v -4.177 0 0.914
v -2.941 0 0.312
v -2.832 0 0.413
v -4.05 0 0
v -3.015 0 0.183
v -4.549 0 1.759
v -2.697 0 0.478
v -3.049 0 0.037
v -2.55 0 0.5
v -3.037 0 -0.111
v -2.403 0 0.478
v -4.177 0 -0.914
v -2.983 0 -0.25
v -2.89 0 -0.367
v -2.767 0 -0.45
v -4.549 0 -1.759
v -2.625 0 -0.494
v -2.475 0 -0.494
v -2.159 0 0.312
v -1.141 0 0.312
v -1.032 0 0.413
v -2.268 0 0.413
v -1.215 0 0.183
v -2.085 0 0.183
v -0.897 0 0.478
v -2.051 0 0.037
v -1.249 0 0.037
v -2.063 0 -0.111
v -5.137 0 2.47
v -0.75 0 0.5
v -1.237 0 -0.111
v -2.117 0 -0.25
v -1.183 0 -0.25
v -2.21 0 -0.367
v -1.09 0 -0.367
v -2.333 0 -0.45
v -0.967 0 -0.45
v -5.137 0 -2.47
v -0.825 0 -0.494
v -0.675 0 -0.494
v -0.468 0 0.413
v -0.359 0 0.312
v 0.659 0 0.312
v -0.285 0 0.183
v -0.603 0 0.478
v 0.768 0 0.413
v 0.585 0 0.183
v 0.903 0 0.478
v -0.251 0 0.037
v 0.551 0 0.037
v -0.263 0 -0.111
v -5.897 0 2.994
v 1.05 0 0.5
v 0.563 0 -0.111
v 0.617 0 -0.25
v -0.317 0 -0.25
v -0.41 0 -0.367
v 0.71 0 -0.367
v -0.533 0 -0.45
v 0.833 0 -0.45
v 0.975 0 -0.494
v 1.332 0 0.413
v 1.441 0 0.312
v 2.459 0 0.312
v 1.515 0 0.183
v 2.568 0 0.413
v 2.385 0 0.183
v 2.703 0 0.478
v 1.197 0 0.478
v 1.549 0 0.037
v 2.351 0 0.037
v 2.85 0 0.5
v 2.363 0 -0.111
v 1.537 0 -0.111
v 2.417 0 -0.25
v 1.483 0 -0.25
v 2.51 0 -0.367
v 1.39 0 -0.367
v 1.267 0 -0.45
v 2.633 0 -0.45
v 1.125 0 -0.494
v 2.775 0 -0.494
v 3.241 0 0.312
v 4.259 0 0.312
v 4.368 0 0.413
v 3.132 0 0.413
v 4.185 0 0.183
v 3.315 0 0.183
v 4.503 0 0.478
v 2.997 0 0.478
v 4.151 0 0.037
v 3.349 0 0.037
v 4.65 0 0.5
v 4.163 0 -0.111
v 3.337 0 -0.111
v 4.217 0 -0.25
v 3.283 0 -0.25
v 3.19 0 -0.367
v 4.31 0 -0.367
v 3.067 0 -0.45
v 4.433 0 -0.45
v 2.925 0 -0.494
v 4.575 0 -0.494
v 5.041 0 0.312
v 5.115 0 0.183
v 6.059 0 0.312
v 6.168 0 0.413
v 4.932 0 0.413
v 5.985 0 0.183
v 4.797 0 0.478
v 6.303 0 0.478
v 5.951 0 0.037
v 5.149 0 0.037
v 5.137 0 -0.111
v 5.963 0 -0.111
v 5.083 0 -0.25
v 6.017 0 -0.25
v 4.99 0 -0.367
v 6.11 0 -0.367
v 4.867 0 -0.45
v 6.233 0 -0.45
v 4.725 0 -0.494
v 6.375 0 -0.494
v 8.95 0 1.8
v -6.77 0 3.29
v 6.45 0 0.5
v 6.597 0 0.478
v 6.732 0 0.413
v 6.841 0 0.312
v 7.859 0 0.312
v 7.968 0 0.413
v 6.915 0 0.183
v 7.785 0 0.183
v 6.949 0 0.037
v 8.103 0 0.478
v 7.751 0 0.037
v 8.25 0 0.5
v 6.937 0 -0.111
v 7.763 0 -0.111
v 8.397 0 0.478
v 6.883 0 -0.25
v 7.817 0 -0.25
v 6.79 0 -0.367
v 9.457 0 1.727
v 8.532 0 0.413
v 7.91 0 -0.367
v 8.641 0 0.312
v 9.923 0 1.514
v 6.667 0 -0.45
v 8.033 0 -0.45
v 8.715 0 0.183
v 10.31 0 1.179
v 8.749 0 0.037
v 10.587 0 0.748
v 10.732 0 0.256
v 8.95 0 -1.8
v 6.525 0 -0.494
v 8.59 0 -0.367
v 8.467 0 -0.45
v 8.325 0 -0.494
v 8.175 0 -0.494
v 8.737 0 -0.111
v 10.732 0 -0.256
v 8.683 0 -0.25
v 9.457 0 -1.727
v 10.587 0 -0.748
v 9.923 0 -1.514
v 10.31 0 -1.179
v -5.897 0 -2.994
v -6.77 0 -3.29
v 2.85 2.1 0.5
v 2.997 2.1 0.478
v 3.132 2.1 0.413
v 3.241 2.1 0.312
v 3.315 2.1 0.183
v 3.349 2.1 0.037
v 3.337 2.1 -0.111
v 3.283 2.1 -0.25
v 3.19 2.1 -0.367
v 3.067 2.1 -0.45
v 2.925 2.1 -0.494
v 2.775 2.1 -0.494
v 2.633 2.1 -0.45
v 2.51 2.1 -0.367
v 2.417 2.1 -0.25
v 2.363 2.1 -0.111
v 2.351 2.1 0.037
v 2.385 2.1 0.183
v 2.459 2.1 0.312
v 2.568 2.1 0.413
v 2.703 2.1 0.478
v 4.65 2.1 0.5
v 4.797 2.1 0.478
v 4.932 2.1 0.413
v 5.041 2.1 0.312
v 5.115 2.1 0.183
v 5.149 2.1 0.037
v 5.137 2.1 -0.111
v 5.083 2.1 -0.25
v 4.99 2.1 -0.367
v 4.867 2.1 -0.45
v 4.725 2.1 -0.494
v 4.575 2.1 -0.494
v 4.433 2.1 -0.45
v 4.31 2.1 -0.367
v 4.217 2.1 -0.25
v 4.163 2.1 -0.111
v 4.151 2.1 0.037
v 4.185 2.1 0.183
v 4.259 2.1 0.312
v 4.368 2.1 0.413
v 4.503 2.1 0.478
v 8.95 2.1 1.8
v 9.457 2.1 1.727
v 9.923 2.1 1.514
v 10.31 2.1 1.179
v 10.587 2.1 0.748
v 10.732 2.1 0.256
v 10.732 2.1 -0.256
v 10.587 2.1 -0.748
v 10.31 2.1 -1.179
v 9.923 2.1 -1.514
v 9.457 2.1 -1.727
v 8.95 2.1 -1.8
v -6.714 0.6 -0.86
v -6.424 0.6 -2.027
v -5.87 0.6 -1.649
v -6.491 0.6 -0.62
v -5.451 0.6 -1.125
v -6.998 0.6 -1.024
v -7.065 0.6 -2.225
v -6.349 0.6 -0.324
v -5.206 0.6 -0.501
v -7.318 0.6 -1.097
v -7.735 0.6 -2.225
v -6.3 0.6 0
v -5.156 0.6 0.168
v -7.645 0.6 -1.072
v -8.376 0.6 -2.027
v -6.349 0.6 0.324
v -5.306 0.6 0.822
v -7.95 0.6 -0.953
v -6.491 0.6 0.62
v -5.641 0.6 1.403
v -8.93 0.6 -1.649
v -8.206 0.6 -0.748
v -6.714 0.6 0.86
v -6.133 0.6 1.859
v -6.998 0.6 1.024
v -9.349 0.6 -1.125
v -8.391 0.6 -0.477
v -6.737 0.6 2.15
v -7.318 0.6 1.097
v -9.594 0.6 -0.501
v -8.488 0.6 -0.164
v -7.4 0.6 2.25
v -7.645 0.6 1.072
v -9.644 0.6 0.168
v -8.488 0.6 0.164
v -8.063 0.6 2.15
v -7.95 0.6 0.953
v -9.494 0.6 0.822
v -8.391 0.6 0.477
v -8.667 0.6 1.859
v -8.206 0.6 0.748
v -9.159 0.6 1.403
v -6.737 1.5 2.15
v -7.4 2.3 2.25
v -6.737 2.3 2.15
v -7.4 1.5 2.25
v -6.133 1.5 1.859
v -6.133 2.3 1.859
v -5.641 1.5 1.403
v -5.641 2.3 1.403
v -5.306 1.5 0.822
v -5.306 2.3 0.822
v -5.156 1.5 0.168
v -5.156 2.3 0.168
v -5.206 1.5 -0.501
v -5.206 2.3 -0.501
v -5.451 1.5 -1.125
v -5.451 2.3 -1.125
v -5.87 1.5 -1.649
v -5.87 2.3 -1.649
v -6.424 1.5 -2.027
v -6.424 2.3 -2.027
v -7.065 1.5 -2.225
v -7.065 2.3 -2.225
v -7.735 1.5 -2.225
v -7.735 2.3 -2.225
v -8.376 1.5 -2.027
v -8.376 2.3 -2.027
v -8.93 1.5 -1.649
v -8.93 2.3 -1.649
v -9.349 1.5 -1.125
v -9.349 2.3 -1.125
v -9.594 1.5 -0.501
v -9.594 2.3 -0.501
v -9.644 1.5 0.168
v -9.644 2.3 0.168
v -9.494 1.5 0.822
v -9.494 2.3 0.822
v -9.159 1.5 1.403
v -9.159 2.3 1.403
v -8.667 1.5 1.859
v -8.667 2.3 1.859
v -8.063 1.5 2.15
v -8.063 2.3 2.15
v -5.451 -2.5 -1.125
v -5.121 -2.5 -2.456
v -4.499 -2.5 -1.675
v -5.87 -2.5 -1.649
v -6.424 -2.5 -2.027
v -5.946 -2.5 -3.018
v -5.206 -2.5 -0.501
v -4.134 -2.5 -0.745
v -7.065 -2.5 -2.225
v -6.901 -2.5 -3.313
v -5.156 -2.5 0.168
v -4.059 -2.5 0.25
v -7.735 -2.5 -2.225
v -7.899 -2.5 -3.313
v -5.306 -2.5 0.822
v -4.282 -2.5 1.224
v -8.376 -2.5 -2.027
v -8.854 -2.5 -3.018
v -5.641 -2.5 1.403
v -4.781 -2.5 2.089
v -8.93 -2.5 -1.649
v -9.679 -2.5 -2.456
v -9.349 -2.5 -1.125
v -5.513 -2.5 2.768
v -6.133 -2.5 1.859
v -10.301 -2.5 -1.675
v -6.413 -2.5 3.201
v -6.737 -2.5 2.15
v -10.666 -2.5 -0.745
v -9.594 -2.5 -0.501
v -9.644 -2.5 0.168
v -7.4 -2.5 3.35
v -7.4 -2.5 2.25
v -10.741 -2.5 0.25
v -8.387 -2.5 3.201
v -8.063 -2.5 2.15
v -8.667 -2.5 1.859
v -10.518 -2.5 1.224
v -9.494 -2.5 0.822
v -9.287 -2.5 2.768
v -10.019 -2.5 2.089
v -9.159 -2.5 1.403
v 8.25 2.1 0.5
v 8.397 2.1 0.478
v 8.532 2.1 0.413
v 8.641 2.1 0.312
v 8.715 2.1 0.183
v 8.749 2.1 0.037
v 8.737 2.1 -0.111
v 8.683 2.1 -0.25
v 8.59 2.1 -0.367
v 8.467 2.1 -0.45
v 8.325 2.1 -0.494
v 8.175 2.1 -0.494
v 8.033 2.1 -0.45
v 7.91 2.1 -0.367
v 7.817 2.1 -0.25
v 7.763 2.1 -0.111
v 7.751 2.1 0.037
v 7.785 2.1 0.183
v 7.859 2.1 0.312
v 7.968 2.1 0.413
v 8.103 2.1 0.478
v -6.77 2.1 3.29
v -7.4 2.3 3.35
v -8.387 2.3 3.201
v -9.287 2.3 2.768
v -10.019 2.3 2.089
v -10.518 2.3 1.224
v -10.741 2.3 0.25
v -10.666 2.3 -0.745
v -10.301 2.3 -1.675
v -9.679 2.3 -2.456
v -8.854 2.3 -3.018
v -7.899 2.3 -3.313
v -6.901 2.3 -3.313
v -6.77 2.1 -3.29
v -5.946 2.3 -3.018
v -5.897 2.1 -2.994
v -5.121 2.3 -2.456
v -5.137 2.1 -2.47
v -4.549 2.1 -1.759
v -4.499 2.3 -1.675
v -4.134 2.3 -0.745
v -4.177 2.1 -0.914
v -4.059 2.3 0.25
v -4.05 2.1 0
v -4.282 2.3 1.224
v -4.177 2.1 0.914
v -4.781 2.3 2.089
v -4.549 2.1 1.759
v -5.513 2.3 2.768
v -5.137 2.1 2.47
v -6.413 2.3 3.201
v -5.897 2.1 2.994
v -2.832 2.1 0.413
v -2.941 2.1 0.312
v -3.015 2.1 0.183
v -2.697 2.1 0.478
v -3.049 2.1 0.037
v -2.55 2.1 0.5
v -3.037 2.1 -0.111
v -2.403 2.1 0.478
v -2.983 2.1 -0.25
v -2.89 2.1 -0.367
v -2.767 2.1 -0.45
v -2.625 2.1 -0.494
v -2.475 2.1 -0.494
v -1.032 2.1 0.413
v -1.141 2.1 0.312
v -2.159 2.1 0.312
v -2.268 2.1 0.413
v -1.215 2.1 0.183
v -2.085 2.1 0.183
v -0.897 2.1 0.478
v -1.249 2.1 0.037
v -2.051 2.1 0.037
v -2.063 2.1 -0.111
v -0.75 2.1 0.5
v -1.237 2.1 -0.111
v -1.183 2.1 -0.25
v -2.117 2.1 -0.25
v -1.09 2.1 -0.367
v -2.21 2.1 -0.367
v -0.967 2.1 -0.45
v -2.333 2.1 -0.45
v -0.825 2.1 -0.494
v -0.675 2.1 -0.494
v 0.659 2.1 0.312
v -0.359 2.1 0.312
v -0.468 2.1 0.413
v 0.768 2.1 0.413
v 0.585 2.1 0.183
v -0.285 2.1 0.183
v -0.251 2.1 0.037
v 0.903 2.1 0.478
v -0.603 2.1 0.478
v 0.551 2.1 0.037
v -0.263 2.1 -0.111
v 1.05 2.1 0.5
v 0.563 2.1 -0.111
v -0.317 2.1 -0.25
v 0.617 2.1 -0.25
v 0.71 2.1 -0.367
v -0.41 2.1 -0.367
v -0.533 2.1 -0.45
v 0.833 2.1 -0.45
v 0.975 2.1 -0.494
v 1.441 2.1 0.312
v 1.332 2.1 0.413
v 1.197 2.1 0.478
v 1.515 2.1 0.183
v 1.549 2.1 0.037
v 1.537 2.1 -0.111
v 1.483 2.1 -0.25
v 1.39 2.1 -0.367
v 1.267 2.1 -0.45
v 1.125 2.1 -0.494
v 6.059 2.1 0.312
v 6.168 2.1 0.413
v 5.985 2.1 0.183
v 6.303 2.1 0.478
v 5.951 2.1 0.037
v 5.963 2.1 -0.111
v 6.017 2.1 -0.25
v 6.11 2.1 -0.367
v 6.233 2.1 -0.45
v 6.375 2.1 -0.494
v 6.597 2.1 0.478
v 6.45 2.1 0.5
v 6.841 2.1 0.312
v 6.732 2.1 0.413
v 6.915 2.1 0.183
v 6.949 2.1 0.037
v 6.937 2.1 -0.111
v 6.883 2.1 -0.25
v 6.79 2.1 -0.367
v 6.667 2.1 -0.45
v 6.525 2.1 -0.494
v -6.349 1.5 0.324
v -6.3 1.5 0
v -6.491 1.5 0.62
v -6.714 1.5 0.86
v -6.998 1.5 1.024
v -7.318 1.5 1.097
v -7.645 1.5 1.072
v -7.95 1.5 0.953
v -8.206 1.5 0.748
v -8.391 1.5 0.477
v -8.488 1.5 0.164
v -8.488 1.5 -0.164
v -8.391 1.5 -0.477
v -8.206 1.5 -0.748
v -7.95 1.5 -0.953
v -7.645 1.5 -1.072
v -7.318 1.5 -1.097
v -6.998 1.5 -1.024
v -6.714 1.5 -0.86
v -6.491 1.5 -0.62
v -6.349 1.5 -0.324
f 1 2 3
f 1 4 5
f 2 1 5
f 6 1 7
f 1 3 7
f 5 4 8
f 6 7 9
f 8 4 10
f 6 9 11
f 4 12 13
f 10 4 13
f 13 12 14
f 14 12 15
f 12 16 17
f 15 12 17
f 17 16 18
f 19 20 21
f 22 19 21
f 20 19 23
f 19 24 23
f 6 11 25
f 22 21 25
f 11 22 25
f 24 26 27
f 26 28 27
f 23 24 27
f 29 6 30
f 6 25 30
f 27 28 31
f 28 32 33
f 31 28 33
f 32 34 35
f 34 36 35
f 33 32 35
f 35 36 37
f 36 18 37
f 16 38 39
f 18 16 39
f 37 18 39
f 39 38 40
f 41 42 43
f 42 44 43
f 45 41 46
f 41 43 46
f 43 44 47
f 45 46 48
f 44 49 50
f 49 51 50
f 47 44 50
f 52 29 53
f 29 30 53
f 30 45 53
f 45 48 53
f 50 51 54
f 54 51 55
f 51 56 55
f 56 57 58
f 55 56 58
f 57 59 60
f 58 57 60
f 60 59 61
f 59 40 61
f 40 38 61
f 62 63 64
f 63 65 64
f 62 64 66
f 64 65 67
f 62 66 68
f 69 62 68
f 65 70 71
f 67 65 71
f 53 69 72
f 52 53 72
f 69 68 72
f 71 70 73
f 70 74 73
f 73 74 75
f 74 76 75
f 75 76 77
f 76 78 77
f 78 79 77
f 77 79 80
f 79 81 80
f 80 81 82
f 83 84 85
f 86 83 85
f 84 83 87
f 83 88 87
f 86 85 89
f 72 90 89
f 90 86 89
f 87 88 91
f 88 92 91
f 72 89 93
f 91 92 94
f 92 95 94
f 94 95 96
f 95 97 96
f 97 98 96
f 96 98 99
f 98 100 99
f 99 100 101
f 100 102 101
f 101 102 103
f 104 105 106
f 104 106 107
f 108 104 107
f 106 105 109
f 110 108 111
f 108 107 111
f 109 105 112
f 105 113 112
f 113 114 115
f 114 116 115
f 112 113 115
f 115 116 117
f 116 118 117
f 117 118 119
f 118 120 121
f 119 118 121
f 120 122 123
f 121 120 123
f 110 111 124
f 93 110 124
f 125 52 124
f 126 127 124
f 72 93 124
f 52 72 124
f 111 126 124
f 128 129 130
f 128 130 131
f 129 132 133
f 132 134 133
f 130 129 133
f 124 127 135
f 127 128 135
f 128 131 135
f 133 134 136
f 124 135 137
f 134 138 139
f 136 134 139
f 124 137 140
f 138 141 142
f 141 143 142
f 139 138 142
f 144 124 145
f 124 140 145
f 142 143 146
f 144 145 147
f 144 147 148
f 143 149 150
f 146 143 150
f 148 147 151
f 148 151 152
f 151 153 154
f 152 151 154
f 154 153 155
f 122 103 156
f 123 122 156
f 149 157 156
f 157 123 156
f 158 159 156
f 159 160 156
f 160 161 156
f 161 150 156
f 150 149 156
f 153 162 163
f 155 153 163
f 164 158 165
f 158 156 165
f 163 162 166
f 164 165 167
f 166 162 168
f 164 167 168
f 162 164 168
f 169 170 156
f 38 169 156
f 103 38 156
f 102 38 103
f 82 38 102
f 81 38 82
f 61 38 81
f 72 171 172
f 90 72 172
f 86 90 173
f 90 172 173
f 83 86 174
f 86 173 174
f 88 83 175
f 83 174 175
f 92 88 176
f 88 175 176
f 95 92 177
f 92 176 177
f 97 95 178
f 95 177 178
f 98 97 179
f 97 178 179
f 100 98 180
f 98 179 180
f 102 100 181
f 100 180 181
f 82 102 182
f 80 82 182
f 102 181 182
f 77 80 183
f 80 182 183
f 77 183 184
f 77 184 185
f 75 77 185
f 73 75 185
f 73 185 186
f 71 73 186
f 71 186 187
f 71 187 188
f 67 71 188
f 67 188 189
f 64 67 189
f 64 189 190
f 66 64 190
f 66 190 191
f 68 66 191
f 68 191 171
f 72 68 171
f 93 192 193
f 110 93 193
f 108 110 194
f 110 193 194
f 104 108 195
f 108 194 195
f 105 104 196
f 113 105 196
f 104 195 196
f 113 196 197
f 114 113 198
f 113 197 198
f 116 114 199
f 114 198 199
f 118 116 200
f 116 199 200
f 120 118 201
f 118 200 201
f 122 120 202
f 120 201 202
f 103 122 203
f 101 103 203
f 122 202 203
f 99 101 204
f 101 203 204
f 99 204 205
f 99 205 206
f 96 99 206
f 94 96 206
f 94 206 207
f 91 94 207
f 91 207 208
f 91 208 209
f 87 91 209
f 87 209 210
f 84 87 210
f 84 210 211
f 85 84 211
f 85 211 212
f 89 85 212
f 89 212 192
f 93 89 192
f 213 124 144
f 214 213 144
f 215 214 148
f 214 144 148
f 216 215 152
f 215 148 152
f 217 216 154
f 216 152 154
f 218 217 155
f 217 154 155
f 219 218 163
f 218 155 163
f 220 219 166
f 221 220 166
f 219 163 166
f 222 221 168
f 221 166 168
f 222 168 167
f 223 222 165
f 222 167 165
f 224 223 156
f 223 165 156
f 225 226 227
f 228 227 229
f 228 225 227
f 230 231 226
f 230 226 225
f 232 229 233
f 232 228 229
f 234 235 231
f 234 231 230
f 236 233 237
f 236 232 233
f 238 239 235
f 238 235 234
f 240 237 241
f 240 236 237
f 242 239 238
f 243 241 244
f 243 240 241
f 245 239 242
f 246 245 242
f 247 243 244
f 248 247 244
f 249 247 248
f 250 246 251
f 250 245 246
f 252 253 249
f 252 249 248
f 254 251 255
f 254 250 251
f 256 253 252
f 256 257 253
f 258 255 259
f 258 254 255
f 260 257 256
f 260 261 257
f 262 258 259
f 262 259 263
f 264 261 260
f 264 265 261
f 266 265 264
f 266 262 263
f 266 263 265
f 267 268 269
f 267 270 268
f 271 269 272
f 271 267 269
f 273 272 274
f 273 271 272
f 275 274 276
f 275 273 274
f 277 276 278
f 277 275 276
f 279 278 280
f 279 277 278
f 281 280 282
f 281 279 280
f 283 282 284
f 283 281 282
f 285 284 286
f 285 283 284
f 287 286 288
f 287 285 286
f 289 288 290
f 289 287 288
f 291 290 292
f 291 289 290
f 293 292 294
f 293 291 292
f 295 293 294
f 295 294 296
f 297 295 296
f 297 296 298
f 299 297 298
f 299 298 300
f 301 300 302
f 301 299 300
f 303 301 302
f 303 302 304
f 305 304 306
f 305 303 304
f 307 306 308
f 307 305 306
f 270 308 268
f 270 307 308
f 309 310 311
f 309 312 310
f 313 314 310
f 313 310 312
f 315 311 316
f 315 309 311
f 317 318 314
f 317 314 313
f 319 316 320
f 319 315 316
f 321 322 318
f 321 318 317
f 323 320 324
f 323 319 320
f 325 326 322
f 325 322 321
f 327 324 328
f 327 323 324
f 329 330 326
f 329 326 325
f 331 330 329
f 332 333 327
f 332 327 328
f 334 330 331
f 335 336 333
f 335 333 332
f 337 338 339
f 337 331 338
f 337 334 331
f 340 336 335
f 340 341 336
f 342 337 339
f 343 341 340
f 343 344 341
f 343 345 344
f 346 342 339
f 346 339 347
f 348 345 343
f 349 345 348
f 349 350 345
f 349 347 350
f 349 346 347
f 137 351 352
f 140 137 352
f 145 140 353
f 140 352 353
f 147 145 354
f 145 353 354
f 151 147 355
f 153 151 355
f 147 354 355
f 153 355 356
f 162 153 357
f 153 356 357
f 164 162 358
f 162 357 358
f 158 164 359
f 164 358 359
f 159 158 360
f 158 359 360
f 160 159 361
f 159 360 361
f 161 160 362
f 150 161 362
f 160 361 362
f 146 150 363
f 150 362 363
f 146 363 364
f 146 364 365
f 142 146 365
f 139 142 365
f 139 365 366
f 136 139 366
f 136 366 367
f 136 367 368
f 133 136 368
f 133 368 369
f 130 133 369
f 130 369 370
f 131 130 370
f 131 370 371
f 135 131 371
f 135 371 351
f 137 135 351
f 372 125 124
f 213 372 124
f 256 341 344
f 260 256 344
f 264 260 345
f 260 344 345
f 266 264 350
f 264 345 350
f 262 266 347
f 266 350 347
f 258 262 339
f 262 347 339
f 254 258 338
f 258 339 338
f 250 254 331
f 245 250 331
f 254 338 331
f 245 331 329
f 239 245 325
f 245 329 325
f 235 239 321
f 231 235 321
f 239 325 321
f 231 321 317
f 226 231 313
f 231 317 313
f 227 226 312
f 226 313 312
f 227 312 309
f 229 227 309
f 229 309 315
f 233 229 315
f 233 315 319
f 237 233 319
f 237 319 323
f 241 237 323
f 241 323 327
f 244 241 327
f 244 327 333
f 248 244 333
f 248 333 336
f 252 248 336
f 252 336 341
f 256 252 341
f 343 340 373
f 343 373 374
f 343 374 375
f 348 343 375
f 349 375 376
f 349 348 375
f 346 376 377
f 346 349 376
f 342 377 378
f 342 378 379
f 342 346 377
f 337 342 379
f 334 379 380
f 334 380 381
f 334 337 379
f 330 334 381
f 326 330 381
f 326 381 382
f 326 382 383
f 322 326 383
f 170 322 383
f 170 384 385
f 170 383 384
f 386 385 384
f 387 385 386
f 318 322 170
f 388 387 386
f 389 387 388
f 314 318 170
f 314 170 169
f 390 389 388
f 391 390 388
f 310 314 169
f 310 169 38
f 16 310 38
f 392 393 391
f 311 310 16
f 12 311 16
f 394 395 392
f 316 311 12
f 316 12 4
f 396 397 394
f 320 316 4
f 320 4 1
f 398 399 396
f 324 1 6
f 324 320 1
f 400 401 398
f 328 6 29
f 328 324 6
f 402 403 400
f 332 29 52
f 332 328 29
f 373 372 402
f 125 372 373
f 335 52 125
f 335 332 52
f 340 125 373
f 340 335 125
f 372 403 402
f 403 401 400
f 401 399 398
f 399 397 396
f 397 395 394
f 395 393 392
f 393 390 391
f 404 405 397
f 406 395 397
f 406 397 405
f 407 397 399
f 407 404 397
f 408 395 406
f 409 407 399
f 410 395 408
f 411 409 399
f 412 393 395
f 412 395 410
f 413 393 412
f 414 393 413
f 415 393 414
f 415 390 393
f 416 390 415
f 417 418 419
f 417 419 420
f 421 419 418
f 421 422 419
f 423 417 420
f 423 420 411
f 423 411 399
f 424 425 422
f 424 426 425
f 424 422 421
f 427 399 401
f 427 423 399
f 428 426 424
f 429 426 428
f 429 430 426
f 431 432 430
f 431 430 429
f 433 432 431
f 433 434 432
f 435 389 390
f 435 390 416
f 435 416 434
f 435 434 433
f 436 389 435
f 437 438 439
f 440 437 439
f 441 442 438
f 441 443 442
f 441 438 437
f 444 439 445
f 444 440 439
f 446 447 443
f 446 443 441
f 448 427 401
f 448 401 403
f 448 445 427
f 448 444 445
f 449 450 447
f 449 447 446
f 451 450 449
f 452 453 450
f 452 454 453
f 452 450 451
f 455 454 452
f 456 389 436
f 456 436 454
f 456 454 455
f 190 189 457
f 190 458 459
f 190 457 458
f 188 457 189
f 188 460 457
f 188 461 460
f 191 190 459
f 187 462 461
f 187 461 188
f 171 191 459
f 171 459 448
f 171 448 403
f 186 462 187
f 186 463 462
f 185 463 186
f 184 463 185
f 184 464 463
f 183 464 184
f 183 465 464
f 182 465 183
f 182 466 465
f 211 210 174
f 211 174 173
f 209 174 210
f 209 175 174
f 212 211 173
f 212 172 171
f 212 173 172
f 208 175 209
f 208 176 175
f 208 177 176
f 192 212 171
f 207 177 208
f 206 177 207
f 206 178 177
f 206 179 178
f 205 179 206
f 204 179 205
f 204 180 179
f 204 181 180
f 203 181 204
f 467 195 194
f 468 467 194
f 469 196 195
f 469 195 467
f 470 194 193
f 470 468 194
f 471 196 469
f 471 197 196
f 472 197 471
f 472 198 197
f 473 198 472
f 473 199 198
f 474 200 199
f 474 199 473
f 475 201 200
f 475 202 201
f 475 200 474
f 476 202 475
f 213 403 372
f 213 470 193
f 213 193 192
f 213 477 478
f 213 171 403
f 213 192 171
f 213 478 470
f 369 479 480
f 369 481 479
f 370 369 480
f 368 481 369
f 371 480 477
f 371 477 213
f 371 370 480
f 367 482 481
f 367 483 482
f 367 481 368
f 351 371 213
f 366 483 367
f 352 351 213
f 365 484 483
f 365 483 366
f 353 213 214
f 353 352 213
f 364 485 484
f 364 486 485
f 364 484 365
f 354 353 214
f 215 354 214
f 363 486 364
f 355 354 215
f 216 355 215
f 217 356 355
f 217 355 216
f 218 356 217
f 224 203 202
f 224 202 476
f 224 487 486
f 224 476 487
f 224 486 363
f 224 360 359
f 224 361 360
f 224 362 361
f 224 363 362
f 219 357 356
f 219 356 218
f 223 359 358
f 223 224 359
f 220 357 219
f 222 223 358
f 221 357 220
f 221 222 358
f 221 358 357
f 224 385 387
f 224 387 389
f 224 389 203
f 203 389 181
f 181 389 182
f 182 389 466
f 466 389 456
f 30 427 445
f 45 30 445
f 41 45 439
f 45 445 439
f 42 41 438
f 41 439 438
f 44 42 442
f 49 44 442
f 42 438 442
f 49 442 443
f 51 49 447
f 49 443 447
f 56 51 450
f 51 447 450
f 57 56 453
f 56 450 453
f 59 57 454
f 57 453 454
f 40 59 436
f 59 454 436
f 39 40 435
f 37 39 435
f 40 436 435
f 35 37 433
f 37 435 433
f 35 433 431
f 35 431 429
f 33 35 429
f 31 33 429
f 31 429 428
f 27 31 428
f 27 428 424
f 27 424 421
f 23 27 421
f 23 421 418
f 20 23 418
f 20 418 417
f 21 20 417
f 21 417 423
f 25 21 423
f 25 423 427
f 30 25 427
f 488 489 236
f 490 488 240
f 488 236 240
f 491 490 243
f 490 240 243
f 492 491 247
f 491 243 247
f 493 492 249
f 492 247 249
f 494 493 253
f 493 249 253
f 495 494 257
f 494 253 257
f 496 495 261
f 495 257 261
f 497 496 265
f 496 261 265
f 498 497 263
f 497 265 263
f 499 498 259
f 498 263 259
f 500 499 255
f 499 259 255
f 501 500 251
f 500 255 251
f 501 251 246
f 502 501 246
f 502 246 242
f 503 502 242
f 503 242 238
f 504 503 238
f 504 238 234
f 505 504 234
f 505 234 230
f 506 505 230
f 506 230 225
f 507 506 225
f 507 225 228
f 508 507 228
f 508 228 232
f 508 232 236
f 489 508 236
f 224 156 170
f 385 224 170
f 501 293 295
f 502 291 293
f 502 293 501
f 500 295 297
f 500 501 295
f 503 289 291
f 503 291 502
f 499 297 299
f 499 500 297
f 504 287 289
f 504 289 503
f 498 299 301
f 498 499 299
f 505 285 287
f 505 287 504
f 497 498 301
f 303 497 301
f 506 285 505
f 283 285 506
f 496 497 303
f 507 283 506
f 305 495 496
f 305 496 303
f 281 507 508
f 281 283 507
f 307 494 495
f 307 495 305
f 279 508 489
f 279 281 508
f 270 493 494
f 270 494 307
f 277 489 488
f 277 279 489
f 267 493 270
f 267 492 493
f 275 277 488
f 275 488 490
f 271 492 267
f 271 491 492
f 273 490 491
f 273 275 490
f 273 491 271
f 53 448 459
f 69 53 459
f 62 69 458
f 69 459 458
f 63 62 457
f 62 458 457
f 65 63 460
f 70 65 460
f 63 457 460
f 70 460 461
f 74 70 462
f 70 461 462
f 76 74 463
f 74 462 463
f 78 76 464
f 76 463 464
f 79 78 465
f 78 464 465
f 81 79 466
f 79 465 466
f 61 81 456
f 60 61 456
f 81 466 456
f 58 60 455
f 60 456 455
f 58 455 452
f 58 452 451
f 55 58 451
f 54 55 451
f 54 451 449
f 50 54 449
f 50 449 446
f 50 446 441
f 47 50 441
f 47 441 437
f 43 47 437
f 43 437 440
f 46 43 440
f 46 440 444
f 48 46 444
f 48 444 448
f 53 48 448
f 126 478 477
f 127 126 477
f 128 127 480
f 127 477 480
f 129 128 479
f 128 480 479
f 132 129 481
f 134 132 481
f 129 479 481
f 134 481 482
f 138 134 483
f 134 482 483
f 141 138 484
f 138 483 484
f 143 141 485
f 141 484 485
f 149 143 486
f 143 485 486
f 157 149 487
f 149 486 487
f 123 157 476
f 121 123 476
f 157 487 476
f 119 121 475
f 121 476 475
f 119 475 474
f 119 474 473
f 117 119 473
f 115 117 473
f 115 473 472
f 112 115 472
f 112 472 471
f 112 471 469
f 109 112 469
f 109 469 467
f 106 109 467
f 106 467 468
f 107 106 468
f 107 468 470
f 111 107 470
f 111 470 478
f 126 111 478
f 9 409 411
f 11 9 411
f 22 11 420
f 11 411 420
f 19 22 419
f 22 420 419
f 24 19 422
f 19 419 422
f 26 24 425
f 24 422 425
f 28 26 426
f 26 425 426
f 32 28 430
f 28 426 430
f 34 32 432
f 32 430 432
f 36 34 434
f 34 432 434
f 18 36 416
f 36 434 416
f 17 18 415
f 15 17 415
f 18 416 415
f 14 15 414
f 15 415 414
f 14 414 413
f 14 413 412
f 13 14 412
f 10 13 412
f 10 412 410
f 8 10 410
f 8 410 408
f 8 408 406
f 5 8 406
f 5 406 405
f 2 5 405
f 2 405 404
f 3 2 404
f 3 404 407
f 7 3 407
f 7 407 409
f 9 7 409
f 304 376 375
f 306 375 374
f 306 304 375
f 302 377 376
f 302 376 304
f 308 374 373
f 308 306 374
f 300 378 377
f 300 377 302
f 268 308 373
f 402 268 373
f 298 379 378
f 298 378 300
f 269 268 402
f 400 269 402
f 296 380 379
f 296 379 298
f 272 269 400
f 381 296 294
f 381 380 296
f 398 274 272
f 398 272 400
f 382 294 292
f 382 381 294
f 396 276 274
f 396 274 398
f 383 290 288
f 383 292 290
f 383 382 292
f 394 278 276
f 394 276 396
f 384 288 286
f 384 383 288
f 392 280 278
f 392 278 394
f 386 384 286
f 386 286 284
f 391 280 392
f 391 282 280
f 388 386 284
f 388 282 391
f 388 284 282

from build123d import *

# Parameters (mm, degrees)
BOSS_EXTRU_1_DEPTH      = 2.1
ESQUISSE2_R             = 2.2499999999999973
BOSS_EXTRU_2_DEPTH      = 0.2
ENL_V_START             = -0.8
ESQUISSE4_R             = 2.2499999999999973
ENL_V_MAT_EXTRU_1_DEPTH = 0.8
BOSS_EXTRU_3_START      = 2.5
ESQUISSE5_R             = 3.349999999999999
ESQUISSE5_R_2           = 2.2499999999999973
BOSS_EXTRU_3_DEPTH      = 4.8
ESQUISSE6_R             = 2.2499999999999973
ESQUISSE6_R_2           = 1.1
ENL_V_MAT_EXTRU_2_DEPTH = 3.1
ENL_V_MAT_EXTRU_3_REACH = 14.163
ESQUISSE7_R             = 0.4999999999999999
ESQUISSE7_R_2           = 0.5000000000000001
ESQUISSE7_R_3           = 0.5000000000000003
ESQUISSE7_R_4           = 0.49999999999999895


with BuildPart() as part:
    # Esquisse1 → Boss.-Extru.1 (new body)
    with BuildSketch(Plane(origin=(0, 0, 0), x_dir=(1, 0, 0), z_dir=(0, 1, 0))):
        with BuildLine():
            Line((-6.770489387338948, 3.2903216238761672), (-7.3999999999999995, 3.349999999999998))
            ThreePointArc((-7.3999999999999995, 3.349999999999998), (-9.76880771697493, 2.368807716974932), (-10.749999999999995, 1.67e-15))
            Line((-10.75, 1.97e-15), (-8.499999999999998, 1.97e-15))
            ThreePointArc((-8.499999999999998, 2.11e-15), (-7.399999999999999, 1.100000000000002), (-6.299999999999999, 1.97e-15))
            Line((-6.299999999999999, 1.97e-15), (10.75, 1.97e-15))
            ThreePointArc((10.75, 2.03e-15), (10.222792206135784, 1.2727922061357861), (8.95, 1.8000000000000005))
            Line((8.95, 1.8000000000000007), (-6.770489387338948, 3.2903216238761672))
        make_face()
        with BuildLine():
            Line((-8.499999999999998, 1.97e-15), (-10.75, 1.97e-15))
            ThreePointArc((-10.749999999999995, 1.67e-15), (-9.76880771697493, -2.3688077169749304), (-7.3999999999999995, -3.349999999999998))
            Line((-7.3999999999999995, -3.349999999999998), (-6.770489387338948, -3.2903216238761672))
            Line((-6.770489387338948, -3.2903216238761672), (8.95, -1.799999999999998))
            ThreePointArc((8.949999999999998, -1.7999999999999992), (10.222792206135784, -1.272792206135785), (10.75, 2.03e-15))
            Line((10.75, 1.97e-15), (-6.299999999999999, 1.97e-15))
            ThreePointArc((-6.299999999999999, 1.71e-15), (-7.399999999999999, -1.099999999999998), (-8.499999999999998, 2.11e-15))
        make_face()
    extrude(amount=BOSS_EXTRU_1_DEPTH)

    # Esquisse2 → Boss.-Extru.2 (add)
    # profile 1 of 3: a face of its own
    with BuildSketch(Plane(origin=(0, 2.1, 0), x_dir=(1, 0, 0), z_dir=(0, 1, 0))):
        with BuildLine():
            Line((-6.770489387338715, 3.290321623876145), (-7.399999999999999, 3.3499999999999974))
            ThreePointArc((-7.3999999999999995, 3.3499999999999974), (-10.749999999999995, 1.8e-16), (-7.4, -3.3499999999999983))
            Line((-7.3999999999999995, -3.349999999999998), (-6.770489387338895, -3.2903216238761623))
            ThreePointArc((-6.770489387338895, -3.290321623876155), (-4.8182021232855305, -2.1346708701325934), (-4.050000000000001, 1.15e-15))
            ThreePointArc((-4.050000000000001, 1.97e-15), (-4.818202123285472, 2.1346708701325254), (-6.770489387338716, 3.290321623876124))
        make_face()
        with Locations(Location((-7.399999999999999, 1.97e-15, 0), (0, 0, 270))):
            Circle(ESQUISSE2_R, mode=Mode.SUBTRACT)
    # profile 2 of 3: a face of its own
    with BuildSketch(Plane(origin=(0, 2.1, 0), x_dir=(1, 0, 0), z_dir=(0, 1, 0))):
        with BuildLine():
            ThreePointArc((-6.770489387338715, 3.290321623876124), (-7.083833461594222, 3.3350470341499694), (-7.3999999999999995, 3.3499999999999996))
            Line((-7.399999999999999, 3.3499999999999974), (-6.770489387338715, 3.290321623876145))
        make_face()
    # profile 3 of 3: a face of its own
    with BuildSketch(Plane(origin=(0, 2.1, 0), x_dir=(1, 0, 0), z_dir=(0, 1, 0))):
        with BuildLine():
            Line((-6.770489387338895, -3.2903216238761623), (-7.3999999999999995, -3.349999999999998))
            ThreePointArc((-7.3999999999999995, -3.349999999999996), (-7.0838334615943115, -3.3350470341499743), (-6.770489387338895, -3.290321623876155))
        make_face()
    extrude(amount=BOSS_EXTRU_2_DEPTH)

    # Esquisse4 → Enlèv. mat.-Extru.1 (cut)
    with BuildSketch(Plane(origin=(0, 2.3000000000000003, 0), x_dir=(1, 0, 0), z_dir=(0, 1, 0)).offset(ENL_V_START)):
        with Locations(Location((-7.399999999999999, 1.97e-15, 0), (0, 0, 270))):
            Circle(ESQUISSE4_R)
    extrude(amount=ENL_V_MAT_EXTRU_1_DEPTH, mode=Mode.SUBTRACT)

    # Esquisse5 → Boss.-Extru.3 (add)
    with BuildSketch(Plane.XZ.offset(BOSS_EXTRU_3_START)):
        with Locations(Location((-7.399999999999999, -1.97e-15, 0), (0, 0, 90))):
            Circle(ESQUISSE5_R)
        with Locations(Location((-7.399999999999999, -1.97e-15, 0), (0, 0, 90))):
            Circle(ESQUISSE5_R_2, mode=Mode.SUBTRACT)
    extrude(amount=-BOSS_EXTRU_3_DEPTH)

    # Esquisse6 → Enlèv. mat.-Extru.2 (cut)
    with BuildSketch(Plane.XZ.offset(2.499999999999999)):
        with Locations(Location((-7.399999999999999, -1.97e-15, 0), (0, 0, 90))):
            Circle(ESQUISSE6_R)
        with Locations(Location((-7.399999999999999, -1.97e-15, 0), (0, 0, 270))):
            Circle(ESQUISSE6_R_2, mode=Mode.SUBTRACT)
    extrude(amount=-ENL_V_MAT_EXTRU_2_DEPTH, mode=Mode.SUBTRACT)

    # Esquisse7 → Enlèv. mat.-Extru.3 (cut, up to next)
    with BuildSketch(Plane(origin=(0, 2.1, 0), x_dir=(1, 0, 0), z_dir=(0, 1, 0)), mode=Mode.PRIVATE) as enl_v_mat_extru_3_sk1:
        with Locations(Location((-2.55, -3e-17, 0), (0, 0, 270))):
            Circle(ESQUISSE7_R)
    enl_v_mat_extru_3_tool1 = extrude(enl_v_mat_extru_3_sk1.sketch, amount=-ENL_V_MAT_EXTRU_3_REACH, mode=Mode.PRIVATE) & part.part
    # Esquisse7 → Enlèv. mat.-Extru.3 (cut, up to next)
    with BuildSketch(Plane(origin=(0, 2.1, 0), x_dir=(1, 0, 0), z_dir=(0, 1, 0)), mode=Mode.PRIVATE) as enl_v_mat_extru_3_sk2:
        with Locations(Location((-0.7500000000000002, -1e-17, 0), (0, 0, 270))):
            Circle(ESQUISSE7_R_2)
    enl_v_mat_extru_3_tool2 = extrude(enl_v_mat_extru_3_sk2.sketch, amount=-ENL_V_MAT_EXTRU_3_REACH, mode=Mode.PRIVATE) & part.part
    # Esquisse7 → Enlèv. mat.-Extru.3 (cut, up to next)
    with BuildSketch(Plane(origin=(0, 2.1, 0), x_dir=(1, 0, 0), z_dir=(0, 1, 0)), mode=Mode.PRIVATE) as enl_v_mat_extru_3_sk3:
        with Locations(Location((1.0499999999999994, 1e-17, 0), (0, 0, 270))):
            Circle(ESQUISSE7_R_3)
    enl_v_mat_extru_3_tool3 = extrude(enl_v_mat_extru_3_sk3.sketch, amount=-ENL_V_MAT_EXTRU_3_REACH, mode=Mode.PRIVATE) & part.part
    # Esquisse7 → Enlèv. mat.-Extru.3 (cut, up to next)
    with BuildSketch(Plane(origin=(0, 2.1, 0), x_dir=(1, 0, 0), z_dir=(0, 1, 0)), mode=Mode.PRIVATE) as enl_v_mat_extru_3_sk4:
        with Locations(Location((2.8499999999999988, 2e-17, 0), (0, 0, 270))):
            Circle(ESQUISSE7_R_3)
    enl_v_mat_extru_3_tool4 = extrude(enl_v_mat_extru_3_sk4.sketch, amount=-ENL_V_MAT_EXTRU_3_REACH, mode=Mode.PRIVATE) & part.part
    # Esquisse7 → Enlèv. mat.-Extru.3 (cut, up to next)
    with BuildSketch(Plane(origin=(0, 2.1, 0), x_dir=(1, 0, 0), z_dir=(0, 1, 0)), mode=Mode.PRIVATE) as enl_v_mat_extru_3_sk5:
        with Locations(Location((4.649999999999998, 4e-17, 0), (0, 0, 270))):
            Circle(ESQUISSE7_R)
    enl_v_mat_extru_3_tool5 = extrude(enl_v_mat_extru_3_sk5.sketch, amount=-ENL_V_MAT_EXTRU_3_REACH, mode=Mode.PRIVATE) & part.part
    # Esquisse7 → Enlèv. mat.-Extru.3 (cut, up to next)
    with BuildSketch(Plane(origin=(0, 2.1, 0), x_dir=(1, 0, 0), z_dir=(0, 1, 0)), mode=Mode.PRIVATE) as enl_v_mat_extru_3_sk6:
        with Locations(Location((6.4499999999999975, 6e-17, 0), (0, 0, 270))):
            Circle(ESQUISSE7_R_4)
    enl_v_mat_extru_3_tool6 = extrude(enl_v_mat_extru_3_sk6.sketch, amount=-ENL_V_MAT_EXTRU_3_REACH, mode=Mode.PRIVATE) & part.part
    # Esquisse7 → Enlèv. mat.-Extru.3 (cut, up to next)
    with BuildSketch(Plane(origin=(0, 2.1, 0), x_dir=(1, 0, 0), z_dir=(0, 1, 0)), mode=Mode.PRIVATE) as enl_v_mat_extru_3_sk7:
        with Locations(Location((8.249999999999996, 8e-17, 0), (0, 0, 270))):
            Circle(ESQUISSE7_R_4)
    enl_v_mat_extru_3_tool7 = extrude(enl_v_mat_extru_3_sk7.sketch, amount=-ENL_V_MAT_EXTRU_3_REACH, mode=Mode.PRIVATE) & part.part
    add(enl_v_mat_extru_3_tool1.solids().sort_by_distance((-2.55, 2.1, 0))[0], mode=Mode.SUBTRACT)
    add(enl_v_mat_extru_3_tool2.solids().sort_by_distance((-0.75, 2.1, 0))[0], mode=Mode.SUBTRACT)
    add(enl_v_mat_extru_3_tool3.solids().sort_by_distance((1.05, 2.1, 0))[0], mode=Mode.SUBTRACT)
    add(enl_v_mat_extru_3_tool4.solids().sort_by_distance((2.85, 2.1, 0))[0], mode=Mode.SUBTRACT)
    add(enl_v_mat_extru_3_tool5.solids().sort_by_distance((4.65, 2.1, 0))[0], mode=Mode.SUBTRACT)
    add(enl_v_mat_extru_3_tool6.solids().sort_by_distance((6.45, 2.1, 0))[0], mode=Mode.SUBTRACT)
    add(enl_v_mat_extru_3_tool7.solids().sort_by_distance((8.25, 2.1, 0))[0], mode=Mode.SUBTRACT)


solid = part.part
